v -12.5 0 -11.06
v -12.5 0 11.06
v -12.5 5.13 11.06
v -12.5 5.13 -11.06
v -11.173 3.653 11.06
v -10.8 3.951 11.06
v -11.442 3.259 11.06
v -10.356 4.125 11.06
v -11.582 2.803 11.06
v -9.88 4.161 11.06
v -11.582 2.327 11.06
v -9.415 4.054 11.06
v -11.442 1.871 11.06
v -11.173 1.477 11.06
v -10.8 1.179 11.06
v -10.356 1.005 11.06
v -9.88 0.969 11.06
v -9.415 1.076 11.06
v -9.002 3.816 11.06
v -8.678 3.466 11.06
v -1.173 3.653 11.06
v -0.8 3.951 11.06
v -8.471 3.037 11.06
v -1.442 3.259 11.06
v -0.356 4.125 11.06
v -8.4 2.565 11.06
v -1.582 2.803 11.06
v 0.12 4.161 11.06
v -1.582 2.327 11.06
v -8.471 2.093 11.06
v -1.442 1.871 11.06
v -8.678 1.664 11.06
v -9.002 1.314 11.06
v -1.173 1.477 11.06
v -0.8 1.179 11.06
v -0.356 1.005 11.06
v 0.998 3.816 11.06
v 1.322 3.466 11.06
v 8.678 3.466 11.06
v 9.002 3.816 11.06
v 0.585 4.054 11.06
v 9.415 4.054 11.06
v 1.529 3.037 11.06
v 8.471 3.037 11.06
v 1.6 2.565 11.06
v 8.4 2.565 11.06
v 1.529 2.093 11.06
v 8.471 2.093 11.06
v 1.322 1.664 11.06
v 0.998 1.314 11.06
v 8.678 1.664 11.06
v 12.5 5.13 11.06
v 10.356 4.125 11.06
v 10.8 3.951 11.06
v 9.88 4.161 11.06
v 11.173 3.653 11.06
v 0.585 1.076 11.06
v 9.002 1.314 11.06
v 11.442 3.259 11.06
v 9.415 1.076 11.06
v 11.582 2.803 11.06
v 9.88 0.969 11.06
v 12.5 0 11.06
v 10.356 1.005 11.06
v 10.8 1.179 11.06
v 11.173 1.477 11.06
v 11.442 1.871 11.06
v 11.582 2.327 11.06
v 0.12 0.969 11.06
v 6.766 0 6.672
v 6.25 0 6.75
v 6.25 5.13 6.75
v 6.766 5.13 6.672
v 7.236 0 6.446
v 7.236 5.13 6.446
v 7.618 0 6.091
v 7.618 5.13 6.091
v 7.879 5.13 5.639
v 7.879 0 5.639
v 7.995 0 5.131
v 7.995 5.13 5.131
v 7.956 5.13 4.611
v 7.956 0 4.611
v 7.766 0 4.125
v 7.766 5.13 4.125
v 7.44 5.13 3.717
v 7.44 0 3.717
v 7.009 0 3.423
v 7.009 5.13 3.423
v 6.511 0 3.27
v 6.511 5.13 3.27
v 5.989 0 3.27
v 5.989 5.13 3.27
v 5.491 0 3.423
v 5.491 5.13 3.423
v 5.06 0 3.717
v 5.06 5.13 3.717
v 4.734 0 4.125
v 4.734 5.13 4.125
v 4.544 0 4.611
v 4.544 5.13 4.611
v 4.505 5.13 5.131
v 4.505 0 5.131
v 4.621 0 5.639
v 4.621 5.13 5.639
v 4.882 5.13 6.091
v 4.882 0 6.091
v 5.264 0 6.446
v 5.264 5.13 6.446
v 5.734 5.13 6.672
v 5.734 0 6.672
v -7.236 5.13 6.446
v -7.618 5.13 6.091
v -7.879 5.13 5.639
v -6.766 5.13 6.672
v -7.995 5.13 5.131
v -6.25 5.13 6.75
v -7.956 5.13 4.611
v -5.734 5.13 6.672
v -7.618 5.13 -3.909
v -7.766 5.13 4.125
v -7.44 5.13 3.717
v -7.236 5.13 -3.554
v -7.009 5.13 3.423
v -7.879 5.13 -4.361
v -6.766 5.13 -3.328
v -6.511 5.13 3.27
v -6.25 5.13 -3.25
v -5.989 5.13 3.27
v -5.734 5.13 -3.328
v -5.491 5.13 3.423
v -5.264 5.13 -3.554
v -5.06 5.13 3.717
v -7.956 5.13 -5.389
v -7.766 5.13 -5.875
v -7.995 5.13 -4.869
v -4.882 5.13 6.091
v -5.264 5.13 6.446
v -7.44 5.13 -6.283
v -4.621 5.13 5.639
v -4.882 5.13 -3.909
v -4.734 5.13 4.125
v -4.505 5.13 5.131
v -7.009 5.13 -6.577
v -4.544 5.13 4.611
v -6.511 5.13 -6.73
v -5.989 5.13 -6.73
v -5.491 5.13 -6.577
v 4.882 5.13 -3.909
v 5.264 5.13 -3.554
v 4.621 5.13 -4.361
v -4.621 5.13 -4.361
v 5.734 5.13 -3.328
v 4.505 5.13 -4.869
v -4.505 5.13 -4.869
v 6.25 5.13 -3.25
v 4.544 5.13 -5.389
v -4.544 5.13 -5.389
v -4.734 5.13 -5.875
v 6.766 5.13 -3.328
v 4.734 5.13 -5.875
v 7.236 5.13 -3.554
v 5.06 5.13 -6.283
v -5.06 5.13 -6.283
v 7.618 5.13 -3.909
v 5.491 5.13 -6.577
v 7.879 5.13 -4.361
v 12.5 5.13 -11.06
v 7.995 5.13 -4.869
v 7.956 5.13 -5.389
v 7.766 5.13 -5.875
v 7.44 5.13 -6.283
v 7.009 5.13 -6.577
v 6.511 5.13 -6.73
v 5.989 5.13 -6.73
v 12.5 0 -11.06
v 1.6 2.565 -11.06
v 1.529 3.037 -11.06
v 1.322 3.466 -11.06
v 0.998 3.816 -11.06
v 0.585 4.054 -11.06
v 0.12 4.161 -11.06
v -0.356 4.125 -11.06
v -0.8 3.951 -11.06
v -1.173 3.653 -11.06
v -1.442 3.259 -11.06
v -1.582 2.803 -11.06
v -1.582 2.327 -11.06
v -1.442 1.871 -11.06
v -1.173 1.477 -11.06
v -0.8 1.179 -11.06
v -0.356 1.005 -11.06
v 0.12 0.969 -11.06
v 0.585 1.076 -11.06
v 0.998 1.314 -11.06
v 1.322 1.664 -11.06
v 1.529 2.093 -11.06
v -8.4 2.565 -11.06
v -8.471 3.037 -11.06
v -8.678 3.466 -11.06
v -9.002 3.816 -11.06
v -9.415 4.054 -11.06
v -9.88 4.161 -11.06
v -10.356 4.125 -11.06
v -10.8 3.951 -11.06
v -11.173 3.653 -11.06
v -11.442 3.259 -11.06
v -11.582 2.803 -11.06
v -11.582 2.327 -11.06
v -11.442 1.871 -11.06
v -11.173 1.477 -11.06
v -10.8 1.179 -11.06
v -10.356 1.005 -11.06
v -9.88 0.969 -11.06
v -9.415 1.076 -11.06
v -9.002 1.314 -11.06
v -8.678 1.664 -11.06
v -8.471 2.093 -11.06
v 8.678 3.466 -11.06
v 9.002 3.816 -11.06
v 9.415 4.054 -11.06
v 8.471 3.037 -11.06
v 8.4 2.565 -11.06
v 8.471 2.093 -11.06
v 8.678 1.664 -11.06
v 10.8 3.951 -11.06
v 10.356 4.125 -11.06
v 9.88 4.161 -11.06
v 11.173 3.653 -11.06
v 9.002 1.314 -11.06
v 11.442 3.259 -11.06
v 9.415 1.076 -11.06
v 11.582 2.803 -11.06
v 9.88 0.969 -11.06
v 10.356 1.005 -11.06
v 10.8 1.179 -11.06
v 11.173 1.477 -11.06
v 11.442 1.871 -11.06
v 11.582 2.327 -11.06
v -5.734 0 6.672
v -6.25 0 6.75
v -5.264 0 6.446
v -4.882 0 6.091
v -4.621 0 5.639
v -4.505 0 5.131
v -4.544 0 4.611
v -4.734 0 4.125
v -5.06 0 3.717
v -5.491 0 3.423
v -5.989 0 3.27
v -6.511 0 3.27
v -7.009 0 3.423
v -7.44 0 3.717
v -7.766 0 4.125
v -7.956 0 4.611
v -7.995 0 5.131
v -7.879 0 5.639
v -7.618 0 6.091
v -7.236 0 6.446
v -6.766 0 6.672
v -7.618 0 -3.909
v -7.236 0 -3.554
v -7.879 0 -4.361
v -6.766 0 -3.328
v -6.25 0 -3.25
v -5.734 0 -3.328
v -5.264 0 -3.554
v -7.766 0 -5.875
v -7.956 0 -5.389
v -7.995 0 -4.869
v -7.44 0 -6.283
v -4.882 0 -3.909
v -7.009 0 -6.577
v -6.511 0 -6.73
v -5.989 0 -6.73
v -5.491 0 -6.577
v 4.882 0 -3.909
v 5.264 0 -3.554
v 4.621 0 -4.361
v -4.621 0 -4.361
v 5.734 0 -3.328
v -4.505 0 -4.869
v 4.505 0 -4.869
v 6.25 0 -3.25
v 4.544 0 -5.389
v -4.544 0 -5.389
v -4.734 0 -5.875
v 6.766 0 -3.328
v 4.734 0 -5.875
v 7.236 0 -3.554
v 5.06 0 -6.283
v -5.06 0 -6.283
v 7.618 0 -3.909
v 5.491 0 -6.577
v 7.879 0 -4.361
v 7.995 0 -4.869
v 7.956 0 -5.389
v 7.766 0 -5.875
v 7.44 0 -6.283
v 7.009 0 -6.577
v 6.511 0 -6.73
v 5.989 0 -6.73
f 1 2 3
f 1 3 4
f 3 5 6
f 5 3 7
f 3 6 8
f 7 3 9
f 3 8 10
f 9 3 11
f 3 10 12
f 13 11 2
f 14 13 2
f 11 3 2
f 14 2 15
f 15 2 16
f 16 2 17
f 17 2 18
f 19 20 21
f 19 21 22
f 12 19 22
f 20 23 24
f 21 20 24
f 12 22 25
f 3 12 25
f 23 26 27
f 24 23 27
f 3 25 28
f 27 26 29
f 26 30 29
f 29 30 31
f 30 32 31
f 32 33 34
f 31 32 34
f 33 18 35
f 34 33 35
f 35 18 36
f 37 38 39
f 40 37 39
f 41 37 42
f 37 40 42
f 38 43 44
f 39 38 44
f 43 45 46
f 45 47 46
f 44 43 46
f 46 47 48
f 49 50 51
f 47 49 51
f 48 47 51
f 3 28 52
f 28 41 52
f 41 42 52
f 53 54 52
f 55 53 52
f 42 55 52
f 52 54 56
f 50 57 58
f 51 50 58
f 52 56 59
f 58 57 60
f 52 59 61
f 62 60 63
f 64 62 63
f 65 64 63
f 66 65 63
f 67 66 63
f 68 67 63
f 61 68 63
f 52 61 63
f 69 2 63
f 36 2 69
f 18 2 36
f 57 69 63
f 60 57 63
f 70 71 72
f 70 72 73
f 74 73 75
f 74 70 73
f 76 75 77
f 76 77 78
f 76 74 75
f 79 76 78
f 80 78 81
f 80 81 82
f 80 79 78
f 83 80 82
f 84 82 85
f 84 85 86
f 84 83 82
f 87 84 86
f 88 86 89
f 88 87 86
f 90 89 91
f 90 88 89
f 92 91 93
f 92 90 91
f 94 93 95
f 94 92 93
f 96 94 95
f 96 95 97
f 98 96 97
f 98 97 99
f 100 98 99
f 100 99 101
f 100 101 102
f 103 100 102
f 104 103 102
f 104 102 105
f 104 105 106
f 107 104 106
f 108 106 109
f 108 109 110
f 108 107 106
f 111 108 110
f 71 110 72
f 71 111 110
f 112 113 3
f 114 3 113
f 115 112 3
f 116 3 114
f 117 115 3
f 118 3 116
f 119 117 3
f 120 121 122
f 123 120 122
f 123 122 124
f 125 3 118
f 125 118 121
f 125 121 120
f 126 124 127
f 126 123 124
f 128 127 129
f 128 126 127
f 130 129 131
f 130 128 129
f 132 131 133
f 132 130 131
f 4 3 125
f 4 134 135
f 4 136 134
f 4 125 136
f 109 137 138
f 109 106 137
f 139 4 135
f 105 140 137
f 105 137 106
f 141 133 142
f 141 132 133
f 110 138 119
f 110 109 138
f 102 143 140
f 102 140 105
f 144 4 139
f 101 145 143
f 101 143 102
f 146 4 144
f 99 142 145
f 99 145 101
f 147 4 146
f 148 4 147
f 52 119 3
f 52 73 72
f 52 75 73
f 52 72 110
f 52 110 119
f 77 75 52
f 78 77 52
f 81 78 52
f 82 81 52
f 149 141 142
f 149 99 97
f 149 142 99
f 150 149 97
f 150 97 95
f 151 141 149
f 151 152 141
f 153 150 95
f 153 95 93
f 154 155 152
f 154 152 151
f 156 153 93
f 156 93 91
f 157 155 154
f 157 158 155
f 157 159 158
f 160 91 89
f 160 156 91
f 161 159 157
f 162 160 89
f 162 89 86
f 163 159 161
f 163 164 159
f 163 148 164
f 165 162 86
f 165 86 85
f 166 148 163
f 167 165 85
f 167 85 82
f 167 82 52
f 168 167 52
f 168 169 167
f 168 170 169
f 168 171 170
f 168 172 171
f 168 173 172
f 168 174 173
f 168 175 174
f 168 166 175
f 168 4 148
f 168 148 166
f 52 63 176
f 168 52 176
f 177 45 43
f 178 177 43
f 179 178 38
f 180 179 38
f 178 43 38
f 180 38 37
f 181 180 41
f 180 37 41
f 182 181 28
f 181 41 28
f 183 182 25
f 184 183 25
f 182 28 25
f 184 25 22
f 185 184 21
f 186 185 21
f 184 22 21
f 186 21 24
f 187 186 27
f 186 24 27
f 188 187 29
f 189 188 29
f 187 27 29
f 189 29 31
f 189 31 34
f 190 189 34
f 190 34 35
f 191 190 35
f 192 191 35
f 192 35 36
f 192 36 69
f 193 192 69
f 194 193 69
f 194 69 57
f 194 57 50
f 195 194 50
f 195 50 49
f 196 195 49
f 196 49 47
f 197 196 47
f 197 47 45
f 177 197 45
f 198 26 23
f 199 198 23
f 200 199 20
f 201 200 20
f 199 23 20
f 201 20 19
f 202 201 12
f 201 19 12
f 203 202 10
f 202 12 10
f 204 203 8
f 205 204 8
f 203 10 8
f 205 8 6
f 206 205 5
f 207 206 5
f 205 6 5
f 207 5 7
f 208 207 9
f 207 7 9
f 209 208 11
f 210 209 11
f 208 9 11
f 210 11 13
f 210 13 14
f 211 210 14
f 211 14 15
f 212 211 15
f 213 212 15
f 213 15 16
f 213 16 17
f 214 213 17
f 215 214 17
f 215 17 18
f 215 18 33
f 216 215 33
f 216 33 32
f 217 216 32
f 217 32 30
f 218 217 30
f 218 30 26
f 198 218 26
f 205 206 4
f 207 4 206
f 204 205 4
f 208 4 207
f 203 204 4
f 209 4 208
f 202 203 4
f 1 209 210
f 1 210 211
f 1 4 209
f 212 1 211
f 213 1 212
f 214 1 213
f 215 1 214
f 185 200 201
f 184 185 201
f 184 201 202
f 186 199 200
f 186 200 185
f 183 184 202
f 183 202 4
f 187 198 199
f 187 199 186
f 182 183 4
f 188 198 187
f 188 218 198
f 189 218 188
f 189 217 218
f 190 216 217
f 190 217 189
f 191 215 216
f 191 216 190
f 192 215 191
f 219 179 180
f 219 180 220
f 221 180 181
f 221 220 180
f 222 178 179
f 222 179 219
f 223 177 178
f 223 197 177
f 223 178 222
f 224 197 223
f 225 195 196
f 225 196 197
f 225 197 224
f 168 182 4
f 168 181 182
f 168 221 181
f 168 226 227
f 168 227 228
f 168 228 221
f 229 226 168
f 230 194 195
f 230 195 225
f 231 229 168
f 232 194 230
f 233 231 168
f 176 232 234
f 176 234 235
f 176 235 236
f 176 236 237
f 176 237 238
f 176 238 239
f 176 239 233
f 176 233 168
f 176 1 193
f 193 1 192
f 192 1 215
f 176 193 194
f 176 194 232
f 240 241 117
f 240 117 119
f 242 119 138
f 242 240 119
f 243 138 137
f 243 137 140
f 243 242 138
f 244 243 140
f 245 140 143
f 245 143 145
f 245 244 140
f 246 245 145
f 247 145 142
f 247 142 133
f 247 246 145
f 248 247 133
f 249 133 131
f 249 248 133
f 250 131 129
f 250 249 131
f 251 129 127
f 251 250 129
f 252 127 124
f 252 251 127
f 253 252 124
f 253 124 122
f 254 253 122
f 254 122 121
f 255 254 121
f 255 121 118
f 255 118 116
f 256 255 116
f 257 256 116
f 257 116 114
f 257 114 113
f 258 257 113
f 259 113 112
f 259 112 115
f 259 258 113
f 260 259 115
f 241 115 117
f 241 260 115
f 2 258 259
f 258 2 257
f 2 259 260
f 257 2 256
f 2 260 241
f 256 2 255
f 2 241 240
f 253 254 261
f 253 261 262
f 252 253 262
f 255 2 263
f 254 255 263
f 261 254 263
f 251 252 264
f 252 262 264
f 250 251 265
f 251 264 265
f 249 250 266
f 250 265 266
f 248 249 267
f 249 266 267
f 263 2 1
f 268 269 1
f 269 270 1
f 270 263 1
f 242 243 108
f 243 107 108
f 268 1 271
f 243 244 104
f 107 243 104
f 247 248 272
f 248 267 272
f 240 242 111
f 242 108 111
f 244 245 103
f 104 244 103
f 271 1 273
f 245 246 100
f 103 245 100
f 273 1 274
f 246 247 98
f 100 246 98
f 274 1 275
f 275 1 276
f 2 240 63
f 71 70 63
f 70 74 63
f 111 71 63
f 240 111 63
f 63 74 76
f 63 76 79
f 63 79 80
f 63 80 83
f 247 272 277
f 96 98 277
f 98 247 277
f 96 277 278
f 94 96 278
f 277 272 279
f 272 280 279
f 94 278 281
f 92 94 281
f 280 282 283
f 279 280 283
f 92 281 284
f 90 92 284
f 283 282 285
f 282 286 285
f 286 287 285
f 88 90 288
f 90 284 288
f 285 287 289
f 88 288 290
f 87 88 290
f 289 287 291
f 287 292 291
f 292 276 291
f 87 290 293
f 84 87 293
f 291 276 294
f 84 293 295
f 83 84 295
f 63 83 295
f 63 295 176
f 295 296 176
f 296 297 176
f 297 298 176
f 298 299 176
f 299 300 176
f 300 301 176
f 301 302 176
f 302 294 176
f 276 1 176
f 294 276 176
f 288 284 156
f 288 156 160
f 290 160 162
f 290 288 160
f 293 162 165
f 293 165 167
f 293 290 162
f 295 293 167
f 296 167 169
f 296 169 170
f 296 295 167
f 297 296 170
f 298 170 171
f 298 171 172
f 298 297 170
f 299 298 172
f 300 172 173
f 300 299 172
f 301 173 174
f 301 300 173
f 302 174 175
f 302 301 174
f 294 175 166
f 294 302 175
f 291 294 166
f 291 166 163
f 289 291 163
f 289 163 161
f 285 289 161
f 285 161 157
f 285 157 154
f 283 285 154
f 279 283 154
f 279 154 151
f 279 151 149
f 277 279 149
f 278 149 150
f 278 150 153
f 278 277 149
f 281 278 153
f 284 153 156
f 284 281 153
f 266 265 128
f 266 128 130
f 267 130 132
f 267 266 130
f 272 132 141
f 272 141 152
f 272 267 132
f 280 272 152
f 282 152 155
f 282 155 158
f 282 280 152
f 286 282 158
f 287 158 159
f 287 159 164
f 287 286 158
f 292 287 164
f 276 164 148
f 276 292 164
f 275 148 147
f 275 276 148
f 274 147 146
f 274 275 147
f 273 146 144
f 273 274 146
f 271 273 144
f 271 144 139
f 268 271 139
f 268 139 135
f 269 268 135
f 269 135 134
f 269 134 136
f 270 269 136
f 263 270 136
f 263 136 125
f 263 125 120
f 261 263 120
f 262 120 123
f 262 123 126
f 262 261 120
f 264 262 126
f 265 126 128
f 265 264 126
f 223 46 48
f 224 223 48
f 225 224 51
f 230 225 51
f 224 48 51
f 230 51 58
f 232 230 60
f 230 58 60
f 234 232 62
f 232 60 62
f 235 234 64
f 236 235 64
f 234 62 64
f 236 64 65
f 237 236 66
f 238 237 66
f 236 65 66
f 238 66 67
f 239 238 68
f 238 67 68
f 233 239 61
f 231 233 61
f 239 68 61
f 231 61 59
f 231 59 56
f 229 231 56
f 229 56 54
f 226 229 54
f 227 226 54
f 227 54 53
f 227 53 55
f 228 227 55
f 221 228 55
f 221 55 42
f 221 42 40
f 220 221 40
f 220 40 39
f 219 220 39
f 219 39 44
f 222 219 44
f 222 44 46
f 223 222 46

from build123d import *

# Parameters (mm, degrees)
SKETCH1_W           = 25
SKETCH1_H           = 22.12
SKETCH1_R           = 1.75
BOSS_EXTRUDE1_DEPTH = 5.13
CUT_EXTRUDE1_REACH  = 27.92
SKETCH2_R           = 1.6


with BuildPart() as part:
    # Sketch1 → Boss-Extrude1 (new body)
    with BuildSketch(Plane(origin=(0, 0, 0), x_dir=(1, 0, 0), z_dir=(0, 1, 0))):
        Rectangle(SKETCH1_W, SKETCH1_H)
        with Locations((-6.25, -5)):
            Circle(SKETCH1_R, mode=Mode.SUBTRACT)
        with Locations((6.25, -5)):
            Circle(SKETCH1_R, mode=Mode.SUBTRACT)
        with Locations((-6.25, 5)):
            Circle(SKETCH1_R, mode=Mode.SUBTRACT)
        with Locations((6.25, 5)):
            Circle(SKETCH1_R, mode=Mode.SUBTRACT)
    extrude(amount=BOSS_EXTRUDE1_DEPTH)

    # Sketch2 → Cut-Extrude1 (cut, up to next)
    with BuildSketch(Plane.XY.offset(11.06), mode=Mode.PRIVATE) as cut_extrude1_sk1:
        with Locations((0, 2.565)):
            Circle(SKETCH2_R)
    cut_extrude1_tool1 = extrude(cut_extrude1_sk1.sketch, amount=-CUT_EXTRUDE1_REACH, mode=Mode.PRIVATE) & part.part
    # Sketch2 → Cut-Extrude1 (cut, up to next)
    with BuildSketch(Plane.XY.offset(11.06), mode=Mode.PRIVATE) as cut_extrude1_sk2:
        with Locations((-10, 2.565)):
            Circle(SKETCH2_R)
    cut_extrude1_tool2 = extrude(cut_extrude1_sk2.sketch, amount=-CUT_EXTRUDE1_REACH, mode=Mode.PRIVATE) & part.part
    # Sketch2 → Cut-Extrude1 (cut, up to next)
    with BuildSketch(Plane.XY.offset(11.06), mode=Mode.PRIVATE) as cut_extrude1_sk3:
        with Locations((10, 2.565)):
            Circle(SKETCH2_R)
    cut_extrude1_tool3 = extrude(cut_extrude1_sk3.sketch, amount=-CUT_EXTRUDE1_REACH, mode=Mode.PRIVATE) & part.part
    add(cut_extrude1_tool1.solids().sort_by_distance((0, 2.565, 11.06))[0], mode=Mode.SUBTRACT)
    add(cut_extrude1_tool2.solids().sort_by_distance((-10, 2.565, 11.06))[0], mode=Mode.SUBTRACT)
    add(cut_extrude1_tool3.solids().sort_by_distance((10, 2.565, 11.06))[0], mode=Mode.SUBTRACT)


solid = part.part
